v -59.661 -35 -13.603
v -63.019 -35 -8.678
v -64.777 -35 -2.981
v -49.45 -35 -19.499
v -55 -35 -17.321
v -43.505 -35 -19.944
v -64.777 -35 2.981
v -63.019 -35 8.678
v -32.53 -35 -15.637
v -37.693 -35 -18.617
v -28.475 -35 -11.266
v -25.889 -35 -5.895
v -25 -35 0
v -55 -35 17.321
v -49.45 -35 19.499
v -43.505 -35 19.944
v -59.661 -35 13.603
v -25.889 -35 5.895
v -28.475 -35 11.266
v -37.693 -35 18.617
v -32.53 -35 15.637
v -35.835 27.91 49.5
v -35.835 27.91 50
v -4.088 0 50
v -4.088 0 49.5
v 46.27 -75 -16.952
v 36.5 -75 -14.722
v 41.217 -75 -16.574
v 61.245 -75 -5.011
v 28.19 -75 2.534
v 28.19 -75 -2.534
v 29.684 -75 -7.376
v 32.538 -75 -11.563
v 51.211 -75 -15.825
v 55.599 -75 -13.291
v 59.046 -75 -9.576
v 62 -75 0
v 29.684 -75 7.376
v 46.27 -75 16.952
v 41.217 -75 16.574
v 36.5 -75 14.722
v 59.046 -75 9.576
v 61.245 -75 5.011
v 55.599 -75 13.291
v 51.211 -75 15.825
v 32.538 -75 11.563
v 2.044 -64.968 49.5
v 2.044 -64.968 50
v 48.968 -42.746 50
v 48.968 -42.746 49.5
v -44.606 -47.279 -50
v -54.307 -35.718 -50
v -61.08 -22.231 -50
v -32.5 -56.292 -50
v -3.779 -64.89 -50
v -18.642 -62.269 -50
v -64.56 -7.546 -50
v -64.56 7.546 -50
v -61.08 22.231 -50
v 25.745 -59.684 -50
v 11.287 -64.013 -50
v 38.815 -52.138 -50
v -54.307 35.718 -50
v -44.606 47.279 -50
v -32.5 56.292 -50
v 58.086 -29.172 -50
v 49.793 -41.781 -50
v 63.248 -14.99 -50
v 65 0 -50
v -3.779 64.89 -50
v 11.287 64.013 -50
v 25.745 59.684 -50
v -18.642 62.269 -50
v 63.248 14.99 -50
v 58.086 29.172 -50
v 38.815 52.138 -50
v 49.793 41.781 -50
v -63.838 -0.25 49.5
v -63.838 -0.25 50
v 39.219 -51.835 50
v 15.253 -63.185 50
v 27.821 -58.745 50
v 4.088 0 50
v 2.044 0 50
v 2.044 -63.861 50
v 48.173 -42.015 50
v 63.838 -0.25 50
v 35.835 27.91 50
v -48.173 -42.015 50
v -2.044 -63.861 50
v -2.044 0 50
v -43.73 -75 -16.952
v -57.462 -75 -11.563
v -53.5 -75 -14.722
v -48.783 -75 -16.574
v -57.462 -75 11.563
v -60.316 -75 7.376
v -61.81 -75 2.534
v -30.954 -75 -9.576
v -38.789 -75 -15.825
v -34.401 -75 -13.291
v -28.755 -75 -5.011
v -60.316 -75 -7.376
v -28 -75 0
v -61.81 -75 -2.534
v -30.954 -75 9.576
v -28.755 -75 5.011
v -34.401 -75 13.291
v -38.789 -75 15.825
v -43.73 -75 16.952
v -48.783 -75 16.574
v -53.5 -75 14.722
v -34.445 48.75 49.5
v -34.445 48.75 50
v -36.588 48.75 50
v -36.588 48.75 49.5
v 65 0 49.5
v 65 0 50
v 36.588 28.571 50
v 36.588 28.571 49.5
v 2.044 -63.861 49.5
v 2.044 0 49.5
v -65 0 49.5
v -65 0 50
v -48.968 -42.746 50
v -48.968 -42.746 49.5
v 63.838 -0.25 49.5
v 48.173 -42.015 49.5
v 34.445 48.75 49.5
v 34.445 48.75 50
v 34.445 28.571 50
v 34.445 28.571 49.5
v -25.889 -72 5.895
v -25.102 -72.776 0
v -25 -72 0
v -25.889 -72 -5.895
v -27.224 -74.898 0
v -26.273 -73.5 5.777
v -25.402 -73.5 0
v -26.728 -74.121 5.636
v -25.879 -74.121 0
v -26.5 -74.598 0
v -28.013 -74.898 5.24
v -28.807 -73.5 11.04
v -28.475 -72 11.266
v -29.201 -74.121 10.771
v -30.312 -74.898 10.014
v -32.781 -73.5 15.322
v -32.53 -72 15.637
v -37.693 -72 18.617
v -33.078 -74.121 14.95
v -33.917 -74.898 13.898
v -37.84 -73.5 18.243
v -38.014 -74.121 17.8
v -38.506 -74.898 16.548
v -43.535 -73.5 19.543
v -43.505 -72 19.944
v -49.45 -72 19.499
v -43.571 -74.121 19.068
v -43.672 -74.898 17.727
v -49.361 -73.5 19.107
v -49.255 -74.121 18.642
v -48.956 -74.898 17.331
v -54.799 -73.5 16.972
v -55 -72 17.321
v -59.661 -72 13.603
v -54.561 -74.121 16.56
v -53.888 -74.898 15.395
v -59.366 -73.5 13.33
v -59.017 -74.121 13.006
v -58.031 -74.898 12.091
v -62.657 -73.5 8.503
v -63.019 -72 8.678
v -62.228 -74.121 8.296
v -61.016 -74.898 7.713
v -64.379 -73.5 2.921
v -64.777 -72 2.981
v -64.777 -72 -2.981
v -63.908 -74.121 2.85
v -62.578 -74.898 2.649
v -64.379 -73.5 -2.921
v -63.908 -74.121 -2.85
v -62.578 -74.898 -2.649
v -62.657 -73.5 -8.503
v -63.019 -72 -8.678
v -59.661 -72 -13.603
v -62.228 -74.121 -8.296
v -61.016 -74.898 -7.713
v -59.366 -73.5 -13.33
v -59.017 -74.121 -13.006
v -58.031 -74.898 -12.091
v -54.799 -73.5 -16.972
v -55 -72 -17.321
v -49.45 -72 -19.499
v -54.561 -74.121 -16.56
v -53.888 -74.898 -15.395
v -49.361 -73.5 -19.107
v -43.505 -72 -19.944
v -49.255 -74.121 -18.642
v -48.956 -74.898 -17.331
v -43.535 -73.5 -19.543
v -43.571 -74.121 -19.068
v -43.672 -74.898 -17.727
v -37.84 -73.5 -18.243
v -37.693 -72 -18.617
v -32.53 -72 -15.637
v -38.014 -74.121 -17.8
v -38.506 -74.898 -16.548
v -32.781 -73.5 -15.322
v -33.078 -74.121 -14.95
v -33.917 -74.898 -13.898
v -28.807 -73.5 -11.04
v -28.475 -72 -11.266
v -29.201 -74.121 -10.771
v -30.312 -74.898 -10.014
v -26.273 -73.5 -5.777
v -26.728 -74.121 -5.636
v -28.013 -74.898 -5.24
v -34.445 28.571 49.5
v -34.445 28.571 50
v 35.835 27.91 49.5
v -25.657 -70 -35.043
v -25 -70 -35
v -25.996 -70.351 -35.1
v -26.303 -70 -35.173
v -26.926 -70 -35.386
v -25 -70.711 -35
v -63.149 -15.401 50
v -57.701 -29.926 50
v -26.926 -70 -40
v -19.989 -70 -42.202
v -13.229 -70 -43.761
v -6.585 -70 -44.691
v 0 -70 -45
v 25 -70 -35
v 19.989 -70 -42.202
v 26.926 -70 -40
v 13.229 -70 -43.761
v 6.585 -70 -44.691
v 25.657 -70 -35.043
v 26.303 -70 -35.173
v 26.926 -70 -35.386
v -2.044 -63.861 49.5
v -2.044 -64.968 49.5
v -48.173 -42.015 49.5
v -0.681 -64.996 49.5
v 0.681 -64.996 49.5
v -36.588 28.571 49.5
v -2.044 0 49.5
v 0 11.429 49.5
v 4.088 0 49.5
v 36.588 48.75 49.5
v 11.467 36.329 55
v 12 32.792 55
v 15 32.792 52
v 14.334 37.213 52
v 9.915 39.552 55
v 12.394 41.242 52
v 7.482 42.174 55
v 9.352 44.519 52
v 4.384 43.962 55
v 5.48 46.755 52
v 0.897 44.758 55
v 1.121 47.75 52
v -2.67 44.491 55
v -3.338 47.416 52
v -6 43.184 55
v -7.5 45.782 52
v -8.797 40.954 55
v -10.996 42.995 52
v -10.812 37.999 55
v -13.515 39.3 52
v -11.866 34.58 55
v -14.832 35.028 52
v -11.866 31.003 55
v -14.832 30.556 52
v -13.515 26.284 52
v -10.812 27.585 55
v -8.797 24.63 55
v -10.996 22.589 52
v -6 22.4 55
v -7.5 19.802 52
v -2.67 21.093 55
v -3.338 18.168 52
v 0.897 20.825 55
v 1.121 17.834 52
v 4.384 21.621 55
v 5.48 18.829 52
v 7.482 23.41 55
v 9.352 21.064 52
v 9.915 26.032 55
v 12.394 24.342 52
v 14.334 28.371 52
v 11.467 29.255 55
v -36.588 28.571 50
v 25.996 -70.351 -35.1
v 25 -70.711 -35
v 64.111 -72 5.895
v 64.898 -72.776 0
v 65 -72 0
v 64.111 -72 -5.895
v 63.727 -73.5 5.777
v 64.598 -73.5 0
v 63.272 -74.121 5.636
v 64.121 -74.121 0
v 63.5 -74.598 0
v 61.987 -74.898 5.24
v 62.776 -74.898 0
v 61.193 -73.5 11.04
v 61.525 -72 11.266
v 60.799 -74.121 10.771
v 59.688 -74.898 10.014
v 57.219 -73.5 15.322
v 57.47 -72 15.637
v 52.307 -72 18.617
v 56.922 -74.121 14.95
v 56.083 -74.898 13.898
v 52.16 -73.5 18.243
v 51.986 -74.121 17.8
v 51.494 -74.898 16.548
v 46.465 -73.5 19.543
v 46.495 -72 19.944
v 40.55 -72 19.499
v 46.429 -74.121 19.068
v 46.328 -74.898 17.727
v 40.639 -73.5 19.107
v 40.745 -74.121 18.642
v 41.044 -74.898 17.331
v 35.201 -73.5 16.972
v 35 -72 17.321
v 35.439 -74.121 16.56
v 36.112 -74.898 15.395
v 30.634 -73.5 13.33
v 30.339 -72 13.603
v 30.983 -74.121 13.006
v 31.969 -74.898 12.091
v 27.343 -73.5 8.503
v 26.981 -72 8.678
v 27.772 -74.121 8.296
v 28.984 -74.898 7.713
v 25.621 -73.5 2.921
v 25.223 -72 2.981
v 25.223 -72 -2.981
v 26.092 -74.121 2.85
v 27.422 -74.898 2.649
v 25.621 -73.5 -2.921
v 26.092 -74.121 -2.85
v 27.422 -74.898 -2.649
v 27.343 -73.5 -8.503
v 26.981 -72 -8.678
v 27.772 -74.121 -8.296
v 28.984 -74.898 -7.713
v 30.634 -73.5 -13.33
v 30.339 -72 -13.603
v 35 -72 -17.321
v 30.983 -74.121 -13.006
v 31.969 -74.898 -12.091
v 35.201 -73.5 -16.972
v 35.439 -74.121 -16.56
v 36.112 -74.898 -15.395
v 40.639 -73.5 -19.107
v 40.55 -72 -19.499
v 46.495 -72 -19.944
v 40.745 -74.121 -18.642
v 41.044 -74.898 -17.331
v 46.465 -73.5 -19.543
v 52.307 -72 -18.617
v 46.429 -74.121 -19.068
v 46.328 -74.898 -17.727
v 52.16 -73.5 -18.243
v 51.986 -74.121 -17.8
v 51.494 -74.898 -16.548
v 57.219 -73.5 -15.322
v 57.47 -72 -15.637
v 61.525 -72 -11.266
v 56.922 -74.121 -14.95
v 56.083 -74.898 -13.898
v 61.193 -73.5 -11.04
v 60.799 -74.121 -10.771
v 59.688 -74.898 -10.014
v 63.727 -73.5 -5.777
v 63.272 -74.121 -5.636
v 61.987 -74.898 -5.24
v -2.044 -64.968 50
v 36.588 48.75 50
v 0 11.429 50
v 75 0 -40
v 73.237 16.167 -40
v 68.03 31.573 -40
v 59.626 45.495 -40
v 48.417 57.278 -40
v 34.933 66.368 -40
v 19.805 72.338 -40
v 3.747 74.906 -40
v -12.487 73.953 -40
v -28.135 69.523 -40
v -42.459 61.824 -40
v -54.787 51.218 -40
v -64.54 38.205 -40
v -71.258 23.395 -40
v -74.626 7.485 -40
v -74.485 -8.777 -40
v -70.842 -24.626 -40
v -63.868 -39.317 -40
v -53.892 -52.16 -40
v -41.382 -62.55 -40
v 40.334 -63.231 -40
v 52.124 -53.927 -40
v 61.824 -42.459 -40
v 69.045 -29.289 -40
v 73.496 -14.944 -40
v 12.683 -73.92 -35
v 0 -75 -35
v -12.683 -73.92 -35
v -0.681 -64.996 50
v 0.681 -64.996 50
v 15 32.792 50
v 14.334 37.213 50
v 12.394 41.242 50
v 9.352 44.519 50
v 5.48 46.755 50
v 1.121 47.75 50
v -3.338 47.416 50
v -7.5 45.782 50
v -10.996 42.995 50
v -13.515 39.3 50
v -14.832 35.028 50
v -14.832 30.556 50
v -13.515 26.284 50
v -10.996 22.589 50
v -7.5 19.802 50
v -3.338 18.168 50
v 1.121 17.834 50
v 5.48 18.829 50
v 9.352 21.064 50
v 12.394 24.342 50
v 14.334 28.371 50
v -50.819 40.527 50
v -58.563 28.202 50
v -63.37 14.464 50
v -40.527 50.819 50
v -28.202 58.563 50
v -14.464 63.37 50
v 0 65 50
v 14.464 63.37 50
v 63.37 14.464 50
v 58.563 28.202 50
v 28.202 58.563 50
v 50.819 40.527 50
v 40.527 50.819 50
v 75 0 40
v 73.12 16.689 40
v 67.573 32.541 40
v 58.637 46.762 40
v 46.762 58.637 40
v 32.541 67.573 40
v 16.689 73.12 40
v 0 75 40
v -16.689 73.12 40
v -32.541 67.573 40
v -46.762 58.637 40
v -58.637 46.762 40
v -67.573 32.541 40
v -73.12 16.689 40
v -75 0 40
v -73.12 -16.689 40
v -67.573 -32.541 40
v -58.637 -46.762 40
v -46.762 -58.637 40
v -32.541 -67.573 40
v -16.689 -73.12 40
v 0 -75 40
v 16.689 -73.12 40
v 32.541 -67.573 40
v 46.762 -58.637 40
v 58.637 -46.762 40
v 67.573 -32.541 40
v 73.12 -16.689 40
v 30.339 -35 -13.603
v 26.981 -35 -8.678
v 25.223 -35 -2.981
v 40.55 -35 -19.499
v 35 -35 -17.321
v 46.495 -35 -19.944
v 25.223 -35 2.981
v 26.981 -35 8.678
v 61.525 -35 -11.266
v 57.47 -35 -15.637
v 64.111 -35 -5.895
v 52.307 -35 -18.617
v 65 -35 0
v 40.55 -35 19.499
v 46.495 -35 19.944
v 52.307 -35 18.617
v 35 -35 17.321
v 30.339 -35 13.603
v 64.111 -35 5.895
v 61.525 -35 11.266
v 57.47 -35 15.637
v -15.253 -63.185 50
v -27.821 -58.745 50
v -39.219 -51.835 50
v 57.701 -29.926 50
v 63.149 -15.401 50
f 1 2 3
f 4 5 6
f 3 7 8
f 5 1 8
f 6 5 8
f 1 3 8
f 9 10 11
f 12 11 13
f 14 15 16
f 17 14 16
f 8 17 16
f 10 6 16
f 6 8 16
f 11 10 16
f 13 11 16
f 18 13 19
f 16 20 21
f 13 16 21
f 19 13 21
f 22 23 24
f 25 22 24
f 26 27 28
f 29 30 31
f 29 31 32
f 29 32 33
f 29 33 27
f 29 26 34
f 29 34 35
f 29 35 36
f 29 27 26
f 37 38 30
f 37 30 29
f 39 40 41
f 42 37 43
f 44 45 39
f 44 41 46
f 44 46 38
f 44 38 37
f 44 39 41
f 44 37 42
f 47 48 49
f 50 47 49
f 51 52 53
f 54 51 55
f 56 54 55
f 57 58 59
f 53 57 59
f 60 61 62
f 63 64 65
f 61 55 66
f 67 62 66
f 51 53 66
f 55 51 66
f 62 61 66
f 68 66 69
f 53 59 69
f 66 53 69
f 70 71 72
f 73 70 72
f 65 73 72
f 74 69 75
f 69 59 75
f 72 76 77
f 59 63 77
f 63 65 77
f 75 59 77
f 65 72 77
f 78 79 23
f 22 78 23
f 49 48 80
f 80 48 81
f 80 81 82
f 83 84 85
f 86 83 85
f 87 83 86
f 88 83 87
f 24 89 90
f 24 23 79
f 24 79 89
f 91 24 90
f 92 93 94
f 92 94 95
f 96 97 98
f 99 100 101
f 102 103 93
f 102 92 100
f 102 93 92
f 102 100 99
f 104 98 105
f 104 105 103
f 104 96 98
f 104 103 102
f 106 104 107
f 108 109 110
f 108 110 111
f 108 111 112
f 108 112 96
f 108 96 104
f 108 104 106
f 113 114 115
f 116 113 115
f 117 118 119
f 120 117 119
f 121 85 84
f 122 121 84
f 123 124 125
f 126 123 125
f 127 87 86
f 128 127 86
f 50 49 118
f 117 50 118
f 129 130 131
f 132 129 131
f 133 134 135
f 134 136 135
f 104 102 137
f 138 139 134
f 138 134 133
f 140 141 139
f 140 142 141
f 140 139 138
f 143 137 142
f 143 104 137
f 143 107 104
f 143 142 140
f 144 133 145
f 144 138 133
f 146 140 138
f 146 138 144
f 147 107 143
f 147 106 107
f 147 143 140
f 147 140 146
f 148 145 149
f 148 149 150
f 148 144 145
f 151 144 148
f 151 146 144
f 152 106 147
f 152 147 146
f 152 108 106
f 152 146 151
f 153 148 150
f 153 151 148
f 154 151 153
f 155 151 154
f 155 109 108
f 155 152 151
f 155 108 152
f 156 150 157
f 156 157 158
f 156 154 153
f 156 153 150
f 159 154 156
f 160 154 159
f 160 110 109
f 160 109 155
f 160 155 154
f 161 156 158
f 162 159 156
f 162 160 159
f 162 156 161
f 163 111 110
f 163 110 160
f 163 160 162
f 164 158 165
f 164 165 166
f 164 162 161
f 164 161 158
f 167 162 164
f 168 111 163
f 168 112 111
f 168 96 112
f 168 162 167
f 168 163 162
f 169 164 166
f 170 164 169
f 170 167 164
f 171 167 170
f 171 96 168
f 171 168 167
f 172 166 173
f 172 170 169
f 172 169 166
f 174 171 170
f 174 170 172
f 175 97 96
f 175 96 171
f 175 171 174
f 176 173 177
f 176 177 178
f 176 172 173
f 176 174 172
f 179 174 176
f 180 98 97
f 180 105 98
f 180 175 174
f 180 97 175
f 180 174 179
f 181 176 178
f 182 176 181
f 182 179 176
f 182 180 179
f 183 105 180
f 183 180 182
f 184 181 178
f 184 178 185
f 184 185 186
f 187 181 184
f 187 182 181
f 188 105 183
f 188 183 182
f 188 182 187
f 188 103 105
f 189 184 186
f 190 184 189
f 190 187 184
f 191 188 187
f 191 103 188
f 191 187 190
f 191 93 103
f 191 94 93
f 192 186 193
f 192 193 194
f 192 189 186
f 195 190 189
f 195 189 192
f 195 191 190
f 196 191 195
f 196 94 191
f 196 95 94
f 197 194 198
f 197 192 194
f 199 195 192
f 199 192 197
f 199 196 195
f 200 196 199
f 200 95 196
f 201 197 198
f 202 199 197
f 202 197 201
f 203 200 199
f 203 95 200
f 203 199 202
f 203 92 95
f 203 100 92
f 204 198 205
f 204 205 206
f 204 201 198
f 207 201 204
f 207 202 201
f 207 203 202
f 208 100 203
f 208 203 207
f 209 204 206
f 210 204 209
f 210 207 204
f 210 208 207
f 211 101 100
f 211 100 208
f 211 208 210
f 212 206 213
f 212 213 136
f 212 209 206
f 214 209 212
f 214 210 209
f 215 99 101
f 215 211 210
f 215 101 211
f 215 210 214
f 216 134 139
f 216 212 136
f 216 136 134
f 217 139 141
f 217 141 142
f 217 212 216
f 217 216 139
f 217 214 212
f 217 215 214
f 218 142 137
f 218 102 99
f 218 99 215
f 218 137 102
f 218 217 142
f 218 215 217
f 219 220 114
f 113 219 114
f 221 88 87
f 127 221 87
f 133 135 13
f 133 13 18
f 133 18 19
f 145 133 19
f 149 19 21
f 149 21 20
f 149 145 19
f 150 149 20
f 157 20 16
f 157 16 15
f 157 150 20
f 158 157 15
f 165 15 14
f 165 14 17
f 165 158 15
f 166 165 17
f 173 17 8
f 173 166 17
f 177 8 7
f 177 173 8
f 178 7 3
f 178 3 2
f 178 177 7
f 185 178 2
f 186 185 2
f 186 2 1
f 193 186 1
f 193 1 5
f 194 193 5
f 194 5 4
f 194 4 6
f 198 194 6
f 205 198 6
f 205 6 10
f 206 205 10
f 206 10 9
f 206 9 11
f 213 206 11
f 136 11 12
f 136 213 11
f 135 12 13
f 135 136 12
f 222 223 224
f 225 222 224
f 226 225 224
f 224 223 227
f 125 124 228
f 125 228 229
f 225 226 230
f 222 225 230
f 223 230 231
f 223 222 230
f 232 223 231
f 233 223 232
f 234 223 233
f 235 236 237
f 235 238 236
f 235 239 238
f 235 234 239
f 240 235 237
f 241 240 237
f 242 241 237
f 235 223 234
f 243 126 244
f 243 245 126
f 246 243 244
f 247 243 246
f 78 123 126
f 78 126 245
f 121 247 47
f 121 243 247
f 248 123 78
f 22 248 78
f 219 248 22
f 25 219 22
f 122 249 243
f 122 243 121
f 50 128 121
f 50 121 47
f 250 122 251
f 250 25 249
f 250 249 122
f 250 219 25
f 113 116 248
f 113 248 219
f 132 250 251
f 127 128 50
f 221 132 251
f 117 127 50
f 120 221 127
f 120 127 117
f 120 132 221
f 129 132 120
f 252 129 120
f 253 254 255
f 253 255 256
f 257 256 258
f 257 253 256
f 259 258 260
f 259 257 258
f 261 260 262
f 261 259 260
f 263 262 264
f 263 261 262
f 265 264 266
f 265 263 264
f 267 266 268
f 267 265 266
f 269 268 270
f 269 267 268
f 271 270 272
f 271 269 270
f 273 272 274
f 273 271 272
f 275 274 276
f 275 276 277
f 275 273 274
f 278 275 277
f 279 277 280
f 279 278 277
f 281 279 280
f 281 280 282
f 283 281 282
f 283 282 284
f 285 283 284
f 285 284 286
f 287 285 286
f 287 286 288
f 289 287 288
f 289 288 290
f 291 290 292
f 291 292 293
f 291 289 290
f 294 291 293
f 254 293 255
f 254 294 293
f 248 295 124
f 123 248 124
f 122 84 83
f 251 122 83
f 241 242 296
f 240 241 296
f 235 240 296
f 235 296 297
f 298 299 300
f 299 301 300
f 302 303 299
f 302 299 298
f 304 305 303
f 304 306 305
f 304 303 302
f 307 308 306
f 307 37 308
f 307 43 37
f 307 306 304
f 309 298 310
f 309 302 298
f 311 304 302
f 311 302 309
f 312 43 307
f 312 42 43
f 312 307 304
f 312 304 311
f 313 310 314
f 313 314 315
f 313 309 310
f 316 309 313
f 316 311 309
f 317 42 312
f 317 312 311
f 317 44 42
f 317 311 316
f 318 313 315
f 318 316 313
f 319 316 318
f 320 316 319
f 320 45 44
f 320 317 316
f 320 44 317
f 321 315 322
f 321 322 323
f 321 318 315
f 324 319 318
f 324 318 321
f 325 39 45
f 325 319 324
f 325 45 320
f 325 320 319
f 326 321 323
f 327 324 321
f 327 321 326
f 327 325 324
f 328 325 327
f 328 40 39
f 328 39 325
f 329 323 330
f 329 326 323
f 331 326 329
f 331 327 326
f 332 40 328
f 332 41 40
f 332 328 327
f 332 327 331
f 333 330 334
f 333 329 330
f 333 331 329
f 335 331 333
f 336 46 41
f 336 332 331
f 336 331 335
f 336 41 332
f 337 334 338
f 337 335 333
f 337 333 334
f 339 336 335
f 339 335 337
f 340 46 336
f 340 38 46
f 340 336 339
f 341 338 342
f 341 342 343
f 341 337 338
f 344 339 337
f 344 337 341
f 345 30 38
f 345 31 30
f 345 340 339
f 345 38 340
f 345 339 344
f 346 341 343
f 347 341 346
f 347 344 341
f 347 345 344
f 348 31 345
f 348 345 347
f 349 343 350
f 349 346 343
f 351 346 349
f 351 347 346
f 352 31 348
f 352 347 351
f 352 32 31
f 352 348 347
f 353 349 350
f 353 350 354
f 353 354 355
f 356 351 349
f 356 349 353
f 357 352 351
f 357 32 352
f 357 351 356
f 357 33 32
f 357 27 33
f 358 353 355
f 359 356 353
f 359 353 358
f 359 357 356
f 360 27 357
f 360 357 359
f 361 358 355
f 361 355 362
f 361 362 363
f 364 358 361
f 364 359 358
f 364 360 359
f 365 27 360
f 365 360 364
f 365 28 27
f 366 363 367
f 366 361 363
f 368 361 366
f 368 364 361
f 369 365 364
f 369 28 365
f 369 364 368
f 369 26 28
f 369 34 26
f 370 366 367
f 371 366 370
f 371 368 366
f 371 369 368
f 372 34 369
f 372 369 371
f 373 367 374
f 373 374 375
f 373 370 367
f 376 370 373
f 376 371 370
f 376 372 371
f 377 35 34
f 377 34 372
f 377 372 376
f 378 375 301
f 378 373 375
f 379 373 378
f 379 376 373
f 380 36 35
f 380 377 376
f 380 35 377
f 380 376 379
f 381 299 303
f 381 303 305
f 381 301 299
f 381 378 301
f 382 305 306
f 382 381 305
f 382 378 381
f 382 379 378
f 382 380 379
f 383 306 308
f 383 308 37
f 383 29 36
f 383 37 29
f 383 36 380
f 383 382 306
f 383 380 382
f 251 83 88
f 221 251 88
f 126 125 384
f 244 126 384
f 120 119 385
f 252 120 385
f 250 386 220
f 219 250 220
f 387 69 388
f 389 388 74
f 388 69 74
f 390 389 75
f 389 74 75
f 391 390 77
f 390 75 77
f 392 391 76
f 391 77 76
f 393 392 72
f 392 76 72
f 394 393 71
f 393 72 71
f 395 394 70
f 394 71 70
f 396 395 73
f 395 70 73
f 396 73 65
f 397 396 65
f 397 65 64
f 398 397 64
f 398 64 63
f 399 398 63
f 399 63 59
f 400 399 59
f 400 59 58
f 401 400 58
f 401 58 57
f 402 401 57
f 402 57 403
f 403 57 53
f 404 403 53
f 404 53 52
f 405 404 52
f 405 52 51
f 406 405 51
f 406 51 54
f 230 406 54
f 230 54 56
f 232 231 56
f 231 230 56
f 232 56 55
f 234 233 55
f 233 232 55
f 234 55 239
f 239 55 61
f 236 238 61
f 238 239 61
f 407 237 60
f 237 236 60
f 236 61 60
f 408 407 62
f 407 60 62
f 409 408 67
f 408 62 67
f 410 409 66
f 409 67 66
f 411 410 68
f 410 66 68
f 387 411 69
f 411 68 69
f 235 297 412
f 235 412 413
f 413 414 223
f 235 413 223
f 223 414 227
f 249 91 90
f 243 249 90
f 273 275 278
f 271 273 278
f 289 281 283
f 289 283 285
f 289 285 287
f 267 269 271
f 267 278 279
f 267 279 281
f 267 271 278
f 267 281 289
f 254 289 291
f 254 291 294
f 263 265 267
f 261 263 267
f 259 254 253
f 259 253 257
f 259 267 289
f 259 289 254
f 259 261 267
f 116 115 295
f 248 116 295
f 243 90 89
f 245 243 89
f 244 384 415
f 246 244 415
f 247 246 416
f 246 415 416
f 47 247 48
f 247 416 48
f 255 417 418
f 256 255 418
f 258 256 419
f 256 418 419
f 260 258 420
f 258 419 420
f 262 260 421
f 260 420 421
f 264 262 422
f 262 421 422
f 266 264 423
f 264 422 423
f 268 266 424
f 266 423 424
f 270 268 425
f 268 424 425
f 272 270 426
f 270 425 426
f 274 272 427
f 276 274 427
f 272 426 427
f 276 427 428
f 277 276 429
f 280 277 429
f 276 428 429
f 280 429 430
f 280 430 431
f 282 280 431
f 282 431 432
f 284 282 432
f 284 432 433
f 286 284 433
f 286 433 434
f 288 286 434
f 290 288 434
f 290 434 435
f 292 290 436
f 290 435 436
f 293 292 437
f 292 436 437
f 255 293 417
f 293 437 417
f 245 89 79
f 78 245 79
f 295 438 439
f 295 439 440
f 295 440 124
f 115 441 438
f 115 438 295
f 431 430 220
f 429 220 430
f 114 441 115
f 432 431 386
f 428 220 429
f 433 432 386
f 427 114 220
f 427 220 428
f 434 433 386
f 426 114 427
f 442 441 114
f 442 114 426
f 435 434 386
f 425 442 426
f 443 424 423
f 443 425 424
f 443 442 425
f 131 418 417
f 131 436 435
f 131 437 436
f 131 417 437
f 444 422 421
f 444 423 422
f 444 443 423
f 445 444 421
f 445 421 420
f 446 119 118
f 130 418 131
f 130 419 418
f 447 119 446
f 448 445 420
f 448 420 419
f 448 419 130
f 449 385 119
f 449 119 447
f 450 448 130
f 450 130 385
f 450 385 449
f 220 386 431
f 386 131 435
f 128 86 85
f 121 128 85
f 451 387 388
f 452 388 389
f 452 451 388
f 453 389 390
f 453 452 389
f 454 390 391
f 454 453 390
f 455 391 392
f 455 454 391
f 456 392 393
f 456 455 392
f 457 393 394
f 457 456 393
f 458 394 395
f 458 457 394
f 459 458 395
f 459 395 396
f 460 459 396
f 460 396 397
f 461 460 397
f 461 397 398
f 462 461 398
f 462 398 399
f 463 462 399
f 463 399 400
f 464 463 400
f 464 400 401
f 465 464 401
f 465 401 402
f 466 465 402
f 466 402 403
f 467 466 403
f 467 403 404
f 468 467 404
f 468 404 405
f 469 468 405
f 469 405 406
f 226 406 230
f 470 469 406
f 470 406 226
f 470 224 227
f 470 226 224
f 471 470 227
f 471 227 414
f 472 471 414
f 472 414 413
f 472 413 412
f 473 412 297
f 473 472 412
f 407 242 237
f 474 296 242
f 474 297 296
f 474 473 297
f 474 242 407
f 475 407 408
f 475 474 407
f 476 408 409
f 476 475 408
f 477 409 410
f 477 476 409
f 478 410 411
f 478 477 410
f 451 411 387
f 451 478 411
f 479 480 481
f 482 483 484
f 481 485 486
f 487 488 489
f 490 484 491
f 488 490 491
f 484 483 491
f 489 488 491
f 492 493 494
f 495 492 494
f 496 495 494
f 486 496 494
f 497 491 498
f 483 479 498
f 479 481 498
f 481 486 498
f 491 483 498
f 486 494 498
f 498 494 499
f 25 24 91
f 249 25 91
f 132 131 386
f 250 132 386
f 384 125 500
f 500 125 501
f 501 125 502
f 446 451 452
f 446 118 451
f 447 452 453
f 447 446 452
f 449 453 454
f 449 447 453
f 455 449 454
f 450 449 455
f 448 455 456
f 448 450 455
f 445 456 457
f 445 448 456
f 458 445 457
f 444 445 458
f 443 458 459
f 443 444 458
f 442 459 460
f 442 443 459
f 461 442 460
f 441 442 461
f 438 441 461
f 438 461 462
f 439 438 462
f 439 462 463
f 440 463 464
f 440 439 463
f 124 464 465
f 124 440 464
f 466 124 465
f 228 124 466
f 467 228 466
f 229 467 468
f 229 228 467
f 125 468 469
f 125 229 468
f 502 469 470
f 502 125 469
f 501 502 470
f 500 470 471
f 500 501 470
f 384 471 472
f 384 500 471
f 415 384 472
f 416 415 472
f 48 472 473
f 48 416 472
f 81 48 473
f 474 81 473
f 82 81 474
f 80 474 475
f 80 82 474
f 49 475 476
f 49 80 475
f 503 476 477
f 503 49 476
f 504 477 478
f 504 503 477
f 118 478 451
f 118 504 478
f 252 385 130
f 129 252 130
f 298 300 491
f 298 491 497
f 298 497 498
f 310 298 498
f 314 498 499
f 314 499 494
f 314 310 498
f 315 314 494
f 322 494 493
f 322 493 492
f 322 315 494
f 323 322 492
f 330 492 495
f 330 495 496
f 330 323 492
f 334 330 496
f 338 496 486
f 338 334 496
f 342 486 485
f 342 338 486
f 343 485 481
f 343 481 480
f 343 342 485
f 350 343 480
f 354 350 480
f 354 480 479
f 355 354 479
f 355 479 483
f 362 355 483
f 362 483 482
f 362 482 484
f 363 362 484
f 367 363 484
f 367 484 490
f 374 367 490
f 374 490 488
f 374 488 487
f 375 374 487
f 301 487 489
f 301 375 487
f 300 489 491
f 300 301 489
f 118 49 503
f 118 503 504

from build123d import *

# Parameters (mm, degrees)
F0_R      = 75
F1_DEPTH  = 50
F2_SIZE   = 10
F4_R      = 20
F5_DEPTH  = 40
F6_R      = 3
F6_2_R    = 3
F4_W      = 60
F4_H      = 5
F7_DEPTH  = 5
F8_R      = 15
F9_DEPTH  = 5
F10_DEPTH = 0.5
F11_SIZE  = 3


with BuildPart() as f1:
    # F0 (on Top) → F1 (new body, symmetric)
    with BuildSketch(Plane.XY):
        Circle(F0_R)
    extrude(amount=F1_DEPTH, both=True)

    # F2
    f2_edges = [f1.edges().sort_by_distance(p)[0] for p in [
        (-75, 0, 50),
        (-75, 0, -50),
    ]]
    chamfer(f2_edges, length=F2_SIZE)

    # F4 (on offset) → F7 (cut)
    with BuildSketch(Plane.XZ.offset(75)):
        with BuildLine():
            ThreePointArc((-25, -35), (-28.5355339059, -36.4644660941), (-30, -40))
            Line((-30, -40), (30, -40))
            ThreePointArc((30, -40), (28.5355339059, -36.4644660941), (25, -35))
            Line((25, -35), (-25, -35))
        make_face()
        with Locations((0, -42.5)):
            Rectangle(F4_W, F4_H)
    extrude(amount=-F7_DEPTH, mode=Mode.SUBTRACT)

    # F8 (on face) → F9 (join)
    with BuildSketch(Plane.XY.offset(50)):
        with Locations((0, 32.7919243128)):
            Circle(F8_R)
    extrude(amount=F9_DEPTH)

    # F8 (on face) → F10 (cut)
    with BuildSketch(Plane.XY.offset(50)):
        Polygon((0, 11.4285722375), (0, 0), (2.0438705105, 0), (4.0877410211, 0), (35.8352803363, 27.9099264723), (36.587741226, 28.5714305937), (36.587741226, 48.7500019372), (34.4448834658, 48.7500019372), (34.4448834658, 28.5714305937), align=None)
        Polygon((-2.0438705105, 0), (0, 0), (0, 11.4285722375), (-34.4448834658, 28.5714305937), (-34.4448834658, 48.7500019372), (-36.587741226, 48.7500019372), (-36.587741226, 28.5714305937), (-35.8352803363, 27.9099264723), (-4.0877410211, 0), align=None)
        Polygon((-2.0438705105, -64.9678581557), (-2.0438705105, -63.861385349), (-48.1734415915, -42.015145565), (-63.8382412242, -0.2499132572), (-35.8352803363, 27.9099264723), (-36.587741226, 28.5714305937), (-65, 0), (-48.9675110444, -42.7455595602), align=None)
        Polygon((48.1734415915, -42.015145565), (2.0438705105, -63.861385349), (2.0438705105, -64.9678581557), (48.9675110444, -42.7455595602), (65, 0), (36.587741226, 28.5714305937), (35.8352803363, 27.9099264723), (63.8382412242, -0.2499132572), align=None)
        with BuildLine():
            Line((2.0438705105, 0), (0, 0))
            Line((0, 0), (-2.0438705105, 0))
            Line((-2.0438705105, 0), (-2.0438705105, -63.861385349))
            Line((-2.0438705105, -63.861385349), (-2.0438705105, -64.9678581557))
            ThreePointArc((-2.0438705105, -64.9678581557), (0, -65), (2.0438705105, -64.9678581557))
            Line((2.0438705105, -64.9678581557), (2.0438705105, -63.861385349))
            Line((2.0438705105, -63.861385349), (2.0438705105, 0))
        make_face()
    extrude(amount=-F10_DEPTH, mode=Mode.SUBTRACT)

    # F11
    f11_edges = [f1.edges().sort_by_distance(p)[0] for p in [
        (-15, 32.791924, 55),
    ]]
    chamfer(f11_edges, length=F11_SIZE)


with BuildPart() as f5:
    # F4 (on offset) → F5 (new body)
    with BuildSketch(Plane.XZ.offset(75)):
        with Locations((-45, 0)):
            Circle(F4_R)
    extrude(amount=-F5_DEPTH)

    # F6
    f6_edges = [f5.edges().sort_by_distance(p)[0] for p in [
        (-65, -75, 0),
    ]]
    fillet(f6_edges, radius=F6_R)


with BuildPart() as f5b:
    # F4 (on offset) → F5, piece 2 (new body)
    with BuildSketch(Plane.XZ.offset(75)):
        with Locations((45, 0)):
            Circle(F4_R)
    extrude(amount=-F5_DEPTH)

    # F6#2
    f6_2_edges = [f5b.edges().sort_by_distance(p)[0] for p in [
        (25, -75, 0),
    ]]
    fillet(f6_2_edges, radius=F6_2_R)


solid = Compound([f1.part, f5.part, f5b.part])
